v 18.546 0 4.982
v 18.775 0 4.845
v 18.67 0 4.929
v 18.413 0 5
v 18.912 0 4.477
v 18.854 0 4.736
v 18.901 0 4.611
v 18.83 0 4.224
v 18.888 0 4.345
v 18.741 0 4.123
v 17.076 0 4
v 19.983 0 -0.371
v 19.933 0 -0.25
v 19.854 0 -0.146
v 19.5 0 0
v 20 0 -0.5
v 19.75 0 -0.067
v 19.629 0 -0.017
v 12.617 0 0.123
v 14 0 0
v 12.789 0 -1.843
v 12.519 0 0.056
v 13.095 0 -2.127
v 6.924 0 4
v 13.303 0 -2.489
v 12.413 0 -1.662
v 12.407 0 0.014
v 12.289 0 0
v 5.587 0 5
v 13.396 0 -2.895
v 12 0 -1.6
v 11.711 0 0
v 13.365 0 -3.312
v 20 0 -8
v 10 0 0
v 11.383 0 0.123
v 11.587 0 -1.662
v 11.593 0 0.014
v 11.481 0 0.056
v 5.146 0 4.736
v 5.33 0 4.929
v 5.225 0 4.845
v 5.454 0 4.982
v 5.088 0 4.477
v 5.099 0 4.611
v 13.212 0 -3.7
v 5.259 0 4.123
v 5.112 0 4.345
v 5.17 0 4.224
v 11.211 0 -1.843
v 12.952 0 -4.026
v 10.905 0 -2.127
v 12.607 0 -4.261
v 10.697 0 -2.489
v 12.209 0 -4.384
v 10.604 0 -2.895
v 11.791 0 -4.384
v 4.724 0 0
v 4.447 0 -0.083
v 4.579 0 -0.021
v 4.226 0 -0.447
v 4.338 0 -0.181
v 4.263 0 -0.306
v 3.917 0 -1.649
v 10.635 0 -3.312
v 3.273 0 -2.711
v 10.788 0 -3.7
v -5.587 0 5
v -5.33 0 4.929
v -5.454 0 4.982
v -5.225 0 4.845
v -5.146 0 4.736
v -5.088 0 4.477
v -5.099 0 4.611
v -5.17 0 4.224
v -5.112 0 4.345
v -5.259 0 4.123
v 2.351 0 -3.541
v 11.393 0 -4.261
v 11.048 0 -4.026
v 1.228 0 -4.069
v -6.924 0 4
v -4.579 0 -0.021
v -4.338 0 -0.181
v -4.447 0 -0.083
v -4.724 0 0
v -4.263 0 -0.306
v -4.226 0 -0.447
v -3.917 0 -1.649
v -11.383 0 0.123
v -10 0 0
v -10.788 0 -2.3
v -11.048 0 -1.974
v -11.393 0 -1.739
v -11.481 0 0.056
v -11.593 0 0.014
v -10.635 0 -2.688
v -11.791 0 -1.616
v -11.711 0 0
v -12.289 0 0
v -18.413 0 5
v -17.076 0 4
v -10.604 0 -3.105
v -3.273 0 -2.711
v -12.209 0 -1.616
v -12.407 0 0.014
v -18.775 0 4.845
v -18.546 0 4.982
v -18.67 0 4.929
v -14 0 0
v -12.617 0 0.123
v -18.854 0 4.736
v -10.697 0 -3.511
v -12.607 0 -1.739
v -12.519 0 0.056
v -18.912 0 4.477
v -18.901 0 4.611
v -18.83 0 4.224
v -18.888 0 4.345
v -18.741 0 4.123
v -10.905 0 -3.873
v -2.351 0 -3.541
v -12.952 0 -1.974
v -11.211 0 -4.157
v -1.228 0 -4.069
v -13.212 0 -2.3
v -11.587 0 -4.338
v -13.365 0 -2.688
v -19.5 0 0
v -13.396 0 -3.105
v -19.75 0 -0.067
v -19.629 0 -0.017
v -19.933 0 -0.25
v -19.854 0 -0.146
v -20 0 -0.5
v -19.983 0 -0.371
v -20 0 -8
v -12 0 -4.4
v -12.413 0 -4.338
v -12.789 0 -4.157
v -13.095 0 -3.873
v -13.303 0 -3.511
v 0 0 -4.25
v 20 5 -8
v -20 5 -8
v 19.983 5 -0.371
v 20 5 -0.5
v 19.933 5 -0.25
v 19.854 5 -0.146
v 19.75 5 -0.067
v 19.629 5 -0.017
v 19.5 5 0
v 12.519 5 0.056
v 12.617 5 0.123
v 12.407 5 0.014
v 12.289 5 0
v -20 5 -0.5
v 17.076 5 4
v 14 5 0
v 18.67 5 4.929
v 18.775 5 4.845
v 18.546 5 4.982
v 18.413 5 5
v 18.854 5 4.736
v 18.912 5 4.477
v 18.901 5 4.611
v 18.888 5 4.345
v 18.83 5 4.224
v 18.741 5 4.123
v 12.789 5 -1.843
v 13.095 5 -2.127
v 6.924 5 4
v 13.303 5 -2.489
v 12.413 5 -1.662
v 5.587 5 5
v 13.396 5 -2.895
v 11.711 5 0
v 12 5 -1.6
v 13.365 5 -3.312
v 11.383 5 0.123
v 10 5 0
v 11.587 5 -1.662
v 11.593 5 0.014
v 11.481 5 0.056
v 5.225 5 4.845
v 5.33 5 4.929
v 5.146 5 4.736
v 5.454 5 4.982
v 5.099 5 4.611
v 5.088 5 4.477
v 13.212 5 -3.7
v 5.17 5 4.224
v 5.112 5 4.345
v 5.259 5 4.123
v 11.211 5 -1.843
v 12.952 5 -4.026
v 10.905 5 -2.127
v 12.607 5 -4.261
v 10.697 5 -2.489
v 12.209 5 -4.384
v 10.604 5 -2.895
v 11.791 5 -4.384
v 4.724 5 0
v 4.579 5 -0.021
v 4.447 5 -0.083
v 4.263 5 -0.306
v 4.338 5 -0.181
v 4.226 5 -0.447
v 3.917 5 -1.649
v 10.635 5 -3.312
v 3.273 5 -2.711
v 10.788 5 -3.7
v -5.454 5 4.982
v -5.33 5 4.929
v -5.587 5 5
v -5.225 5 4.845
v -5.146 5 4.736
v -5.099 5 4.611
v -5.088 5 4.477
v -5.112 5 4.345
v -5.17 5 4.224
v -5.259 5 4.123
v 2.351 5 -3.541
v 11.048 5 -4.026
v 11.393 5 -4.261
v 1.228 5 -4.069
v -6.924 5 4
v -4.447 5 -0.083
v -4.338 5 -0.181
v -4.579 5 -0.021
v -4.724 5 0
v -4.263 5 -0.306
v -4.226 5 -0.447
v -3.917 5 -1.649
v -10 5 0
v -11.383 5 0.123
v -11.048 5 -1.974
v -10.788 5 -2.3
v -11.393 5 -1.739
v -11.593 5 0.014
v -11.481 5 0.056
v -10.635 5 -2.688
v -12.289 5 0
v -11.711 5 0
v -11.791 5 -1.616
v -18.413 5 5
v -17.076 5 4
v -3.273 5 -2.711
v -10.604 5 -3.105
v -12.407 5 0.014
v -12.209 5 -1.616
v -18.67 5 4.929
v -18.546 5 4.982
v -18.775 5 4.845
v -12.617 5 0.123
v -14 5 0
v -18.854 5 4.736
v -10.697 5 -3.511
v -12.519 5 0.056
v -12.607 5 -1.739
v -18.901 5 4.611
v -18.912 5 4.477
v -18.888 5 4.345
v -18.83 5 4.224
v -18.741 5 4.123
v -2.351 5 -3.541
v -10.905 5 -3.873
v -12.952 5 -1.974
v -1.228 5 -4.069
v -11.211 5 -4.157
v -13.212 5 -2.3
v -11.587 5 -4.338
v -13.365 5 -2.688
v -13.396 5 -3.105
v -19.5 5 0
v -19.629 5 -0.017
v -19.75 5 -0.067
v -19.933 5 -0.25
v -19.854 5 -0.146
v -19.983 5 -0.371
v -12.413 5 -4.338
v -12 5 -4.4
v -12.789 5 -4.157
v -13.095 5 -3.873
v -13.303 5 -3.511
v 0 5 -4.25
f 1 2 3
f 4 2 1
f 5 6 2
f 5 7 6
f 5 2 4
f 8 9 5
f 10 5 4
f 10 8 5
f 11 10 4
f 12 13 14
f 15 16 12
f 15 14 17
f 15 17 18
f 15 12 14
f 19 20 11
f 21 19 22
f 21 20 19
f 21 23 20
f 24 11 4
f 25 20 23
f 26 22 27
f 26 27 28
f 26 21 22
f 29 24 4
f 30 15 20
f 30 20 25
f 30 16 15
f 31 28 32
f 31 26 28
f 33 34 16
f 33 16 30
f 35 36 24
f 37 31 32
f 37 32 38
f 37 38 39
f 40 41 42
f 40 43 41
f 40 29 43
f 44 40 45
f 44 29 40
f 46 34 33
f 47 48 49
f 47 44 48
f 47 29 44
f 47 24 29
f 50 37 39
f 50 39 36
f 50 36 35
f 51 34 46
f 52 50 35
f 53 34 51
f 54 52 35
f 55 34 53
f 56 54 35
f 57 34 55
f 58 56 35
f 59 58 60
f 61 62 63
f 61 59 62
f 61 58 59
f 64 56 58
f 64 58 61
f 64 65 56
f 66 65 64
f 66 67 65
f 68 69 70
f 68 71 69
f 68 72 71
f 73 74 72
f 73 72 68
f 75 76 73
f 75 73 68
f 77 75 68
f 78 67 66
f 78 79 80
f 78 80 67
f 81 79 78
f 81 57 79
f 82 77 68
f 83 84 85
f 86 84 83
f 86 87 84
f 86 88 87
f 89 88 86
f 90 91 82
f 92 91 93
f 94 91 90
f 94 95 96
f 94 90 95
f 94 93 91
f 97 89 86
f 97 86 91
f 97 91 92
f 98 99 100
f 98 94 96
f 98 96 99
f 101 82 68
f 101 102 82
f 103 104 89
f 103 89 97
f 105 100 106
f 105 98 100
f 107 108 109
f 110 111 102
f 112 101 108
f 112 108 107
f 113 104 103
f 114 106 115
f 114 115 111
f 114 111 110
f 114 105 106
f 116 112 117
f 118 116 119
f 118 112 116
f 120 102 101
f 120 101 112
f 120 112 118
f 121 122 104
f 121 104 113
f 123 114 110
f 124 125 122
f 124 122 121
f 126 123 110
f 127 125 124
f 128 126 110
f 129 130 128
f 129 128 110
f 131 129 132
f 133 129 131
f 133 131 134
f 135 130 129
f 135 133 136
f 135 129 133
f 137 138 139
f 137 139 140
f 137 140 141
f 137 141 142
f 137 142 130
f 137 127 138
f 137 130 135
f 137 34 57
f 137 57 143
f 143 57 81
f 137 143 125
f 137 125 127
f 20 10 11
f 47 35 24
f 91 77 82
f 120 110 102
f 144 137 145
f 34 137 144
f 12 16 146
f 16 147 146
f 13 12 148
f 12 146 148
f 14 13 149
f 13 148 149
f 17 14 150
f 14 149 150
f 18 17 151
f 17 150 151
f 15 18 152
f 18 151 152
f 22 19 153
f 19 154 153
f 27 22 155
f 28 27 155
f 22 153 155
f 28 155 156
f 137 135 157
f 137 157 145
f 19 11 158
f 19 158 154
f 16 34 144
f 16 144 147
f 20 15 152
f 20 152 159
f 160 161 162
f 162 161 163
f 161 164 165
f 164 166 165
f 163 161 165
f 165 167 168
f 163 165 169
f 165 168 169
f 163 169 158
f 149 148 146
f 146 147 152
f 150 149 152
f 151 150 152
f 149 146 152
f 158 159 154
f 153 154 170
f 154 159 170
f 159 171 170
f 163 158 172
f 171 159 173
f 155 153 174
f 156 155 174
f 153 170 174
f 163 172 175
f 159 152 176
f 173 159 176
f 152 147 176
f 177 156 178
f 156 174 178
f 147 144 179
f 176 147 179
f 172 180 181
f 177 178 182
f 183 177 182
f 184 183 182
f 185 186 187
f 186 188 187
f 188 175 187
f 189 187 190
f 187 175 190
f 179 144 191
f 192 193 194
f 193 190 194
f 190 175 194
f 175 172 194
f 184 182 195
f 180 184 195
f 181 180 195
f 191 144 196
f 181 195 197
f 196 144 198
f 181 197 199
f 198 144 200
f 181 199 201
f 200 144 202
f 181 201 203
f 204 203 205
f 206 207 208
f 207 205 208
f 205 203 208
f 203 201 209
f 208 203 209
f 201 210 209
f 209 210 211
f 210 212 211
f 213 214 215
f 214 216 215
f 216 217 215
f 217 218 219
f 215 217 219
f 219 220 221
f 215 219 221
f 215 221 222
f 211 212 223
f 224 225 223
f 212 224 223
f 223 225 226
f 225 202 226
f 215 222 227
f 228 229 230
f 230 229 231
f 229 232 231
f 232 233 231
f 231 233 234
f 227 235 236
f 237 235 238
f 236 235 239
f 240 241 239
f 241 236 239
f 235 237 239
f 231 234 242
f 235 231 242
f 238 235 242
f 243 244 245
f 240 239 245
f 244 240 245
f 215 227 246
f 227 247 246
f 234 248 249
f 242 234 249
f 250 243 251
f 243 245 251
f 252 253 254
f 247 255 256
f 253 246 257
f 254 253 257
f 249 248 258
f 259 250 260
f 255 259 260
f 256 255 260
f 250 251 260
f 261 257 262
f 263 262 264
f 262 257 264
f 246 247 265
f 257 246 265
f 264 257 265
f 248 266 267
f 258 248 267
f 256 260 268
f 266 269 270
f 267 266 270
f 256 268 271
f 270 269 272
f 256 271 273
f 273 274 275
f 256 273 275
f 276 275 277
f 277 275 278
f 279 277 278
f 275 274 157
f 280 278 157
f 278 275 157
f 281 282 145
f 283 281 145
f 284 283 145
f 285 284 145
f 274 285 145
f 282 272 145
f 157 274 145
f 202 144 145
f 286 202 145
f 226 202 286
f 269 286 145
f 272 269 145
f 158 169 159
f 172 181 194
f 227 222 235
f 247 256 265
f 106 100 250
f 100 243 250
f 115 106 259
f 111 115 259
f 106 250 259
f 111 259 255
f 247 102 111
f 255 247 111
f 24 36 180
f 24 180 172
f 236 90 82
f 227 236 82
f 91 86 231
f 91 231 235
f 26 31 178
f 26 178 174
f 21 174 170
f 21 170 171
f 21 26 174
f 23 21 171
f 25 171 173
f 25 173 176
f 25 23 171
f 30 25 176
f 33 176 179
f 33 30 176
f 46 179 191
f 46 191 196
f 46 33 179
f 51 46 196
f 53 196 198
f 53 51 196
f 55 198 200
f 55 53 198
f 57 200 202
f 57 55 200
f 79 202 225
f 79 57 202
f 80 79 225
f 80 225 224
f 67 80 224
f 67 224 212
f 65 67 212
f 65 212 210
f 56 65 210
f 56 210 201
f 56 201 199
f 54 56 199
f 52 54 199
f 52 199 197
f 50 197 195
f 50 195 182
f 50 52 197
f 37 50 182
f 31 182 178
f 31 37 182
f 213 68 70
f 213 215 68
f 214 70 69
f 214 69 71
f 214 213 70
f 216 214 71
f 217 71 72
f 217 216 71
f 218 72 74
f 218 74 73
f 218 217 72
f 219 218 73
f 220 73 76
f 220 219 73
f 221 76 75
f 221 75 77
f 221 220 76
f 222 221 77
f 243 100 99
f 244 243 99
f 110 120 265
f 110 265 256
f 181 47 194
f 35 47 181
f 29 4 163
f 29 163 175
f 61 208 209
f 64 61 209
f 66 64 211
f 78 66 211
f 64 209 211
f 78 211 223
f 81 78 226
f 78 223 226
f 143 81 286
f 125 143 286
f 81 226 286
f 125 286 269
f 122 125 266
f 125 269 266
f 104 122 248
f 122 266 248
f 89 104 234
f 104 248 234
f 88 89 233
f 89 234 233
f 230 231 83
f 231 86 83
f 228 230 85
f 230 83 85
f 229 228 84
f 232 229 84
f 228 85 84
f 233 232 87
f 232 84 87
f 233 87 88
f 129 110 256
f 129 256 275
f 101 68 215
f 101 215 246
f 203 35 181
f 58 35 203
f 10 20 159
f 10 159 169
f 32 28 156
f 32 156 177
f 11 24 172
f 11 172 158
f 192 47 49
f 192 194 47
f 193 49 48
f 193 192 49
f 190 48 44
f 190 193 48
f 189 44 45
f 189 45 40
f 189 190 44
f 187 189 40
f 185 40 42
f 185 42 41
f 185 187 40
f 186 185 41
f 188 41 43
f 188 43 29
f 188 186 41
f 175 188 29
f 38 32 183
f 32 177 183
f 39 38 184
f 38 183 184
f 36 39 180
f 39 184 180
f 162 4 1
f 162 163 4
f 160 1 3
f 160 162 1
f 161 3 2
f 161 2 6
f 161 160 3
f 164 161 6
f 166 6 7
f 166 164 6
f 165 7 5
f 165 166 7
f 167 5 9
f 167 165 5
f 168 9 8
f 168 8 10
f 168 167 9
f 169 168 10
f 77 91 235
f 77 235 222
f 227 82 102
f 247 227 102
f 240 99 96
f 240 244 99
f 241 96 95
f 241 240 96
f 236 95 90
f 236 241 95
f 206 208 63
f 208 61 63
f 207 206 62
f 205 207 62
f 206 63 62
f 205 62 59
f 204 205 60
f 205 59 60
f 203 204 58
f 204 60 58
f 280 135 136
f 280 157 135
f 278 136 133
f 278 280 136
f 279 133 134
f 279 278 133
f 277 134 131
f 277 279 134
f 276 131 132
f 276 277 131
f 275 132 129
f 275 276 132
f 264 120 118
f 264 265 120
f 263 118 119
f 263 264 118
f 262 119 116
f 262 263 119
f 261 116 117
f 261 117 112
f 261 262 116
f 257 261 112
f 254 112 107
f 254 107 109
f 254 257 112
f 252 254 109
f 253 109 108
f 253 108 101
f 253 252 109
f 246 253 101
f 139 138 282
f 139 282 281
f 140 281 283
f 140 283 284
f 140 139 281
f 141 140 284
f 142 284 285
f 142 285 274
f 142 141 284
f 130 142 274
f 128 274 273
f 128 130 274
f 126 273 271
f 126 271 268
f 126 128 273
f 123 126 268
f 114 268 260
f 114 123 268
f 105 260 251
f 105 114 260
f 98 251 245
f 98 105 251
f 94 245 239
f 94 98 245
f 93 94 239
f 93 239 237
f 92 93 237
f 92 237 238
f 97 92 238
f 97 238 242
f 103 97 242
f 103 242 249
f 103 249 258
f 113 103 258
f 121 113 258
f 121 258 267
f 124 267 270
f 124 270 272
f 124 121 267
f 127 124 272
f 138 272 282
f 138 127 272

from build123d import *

# Parameters (mm, degrees)
SKETCH1_R           = 1.4
BOSS_EXTRUDE1_DEPTH = 5
CUT_EXTRUDE1_DEPTH  = 23.113344387
FILLET1_R           = 0.5


with BuildPart() as part:
    # Sketch1 → Boss-Extrude1 (new body)
    with BuildSketch(Plane(origin=(0, 0, 0), x_dir=(1, 0, 0), z_dir=(0, 1, 0))):
        Polygon((-20, 8), (20, 8), (20, 0), (14, 0), (19.75, -5), (4.25, -5), (10, 0), (-10, 0), (-4.25, -5), (-19.75, -5), (-14, 0), (-20, 0), align=None)
        with Locations(Location((12, 3, 0), (0, 0, 270))):
            Circle(SKETCH1_R, mode=Mode.SUBTRACT)
        with Locations(Location((-12, 3, 0), (0, 0, 90))):
            Circle(SKETCH1_R, mode=Mode.SUBTRACT)
        Polygon((12.476024935, 0), (11.523975065, 0), (6.923975065, -4), (17.076024935, -4), align=None, mode=Mode.SUBTRACT)
        Polygon((-12.476024935, 0), (-11.523975065, 0), (-6.923975065, -4), (-17.076024935, -4), align=None, mode=Mode.SUBTRACT)
    extrude(amount=BOSS_EXTRUDE1_DEPTH)

    # Sketch2 → Cut-Extrude1 (cut, through all)
    with BuildSketch(Plane(origin=(0, 5, 0), x_dir=(1, 0, 0), z_dir=(0, 1, 0))):
        with BuildLine():
            Line((-4.25, 0), (4.25, 0))
            ThreePointArc((4.25, 0), (0, 4.25), (-4.25, 0))
        make_face()
    extrude(amount=-CUT_EXTRUDE1_DEPTH, mode=Mode.SUBTRACT)

    # Fillet1
    fillet1_edges = [part.edges().sort_by_distance(p)[0] for p in [
        (20, 2.5, 0),
        (19.75, 2.5, 5),
        (4.25, 2.5, 5),
        (-4.25, 2.5, 5),
        (-19.75, 2.5, 5),
        (-20, 2.5, 0),
        (11.523975065, 2.5, 0),
        (12.476024935, 2.5, 0),
        (-12.476024935, 2.5, 0),
        (-11.523975065, 2.5, 0),
        (-4.25, 2.5, 0),
        (4.25, 2.5, 0),
    ]]
    fillet(fillet1_edges, radius=FILLET1_R)


solid = part.part
